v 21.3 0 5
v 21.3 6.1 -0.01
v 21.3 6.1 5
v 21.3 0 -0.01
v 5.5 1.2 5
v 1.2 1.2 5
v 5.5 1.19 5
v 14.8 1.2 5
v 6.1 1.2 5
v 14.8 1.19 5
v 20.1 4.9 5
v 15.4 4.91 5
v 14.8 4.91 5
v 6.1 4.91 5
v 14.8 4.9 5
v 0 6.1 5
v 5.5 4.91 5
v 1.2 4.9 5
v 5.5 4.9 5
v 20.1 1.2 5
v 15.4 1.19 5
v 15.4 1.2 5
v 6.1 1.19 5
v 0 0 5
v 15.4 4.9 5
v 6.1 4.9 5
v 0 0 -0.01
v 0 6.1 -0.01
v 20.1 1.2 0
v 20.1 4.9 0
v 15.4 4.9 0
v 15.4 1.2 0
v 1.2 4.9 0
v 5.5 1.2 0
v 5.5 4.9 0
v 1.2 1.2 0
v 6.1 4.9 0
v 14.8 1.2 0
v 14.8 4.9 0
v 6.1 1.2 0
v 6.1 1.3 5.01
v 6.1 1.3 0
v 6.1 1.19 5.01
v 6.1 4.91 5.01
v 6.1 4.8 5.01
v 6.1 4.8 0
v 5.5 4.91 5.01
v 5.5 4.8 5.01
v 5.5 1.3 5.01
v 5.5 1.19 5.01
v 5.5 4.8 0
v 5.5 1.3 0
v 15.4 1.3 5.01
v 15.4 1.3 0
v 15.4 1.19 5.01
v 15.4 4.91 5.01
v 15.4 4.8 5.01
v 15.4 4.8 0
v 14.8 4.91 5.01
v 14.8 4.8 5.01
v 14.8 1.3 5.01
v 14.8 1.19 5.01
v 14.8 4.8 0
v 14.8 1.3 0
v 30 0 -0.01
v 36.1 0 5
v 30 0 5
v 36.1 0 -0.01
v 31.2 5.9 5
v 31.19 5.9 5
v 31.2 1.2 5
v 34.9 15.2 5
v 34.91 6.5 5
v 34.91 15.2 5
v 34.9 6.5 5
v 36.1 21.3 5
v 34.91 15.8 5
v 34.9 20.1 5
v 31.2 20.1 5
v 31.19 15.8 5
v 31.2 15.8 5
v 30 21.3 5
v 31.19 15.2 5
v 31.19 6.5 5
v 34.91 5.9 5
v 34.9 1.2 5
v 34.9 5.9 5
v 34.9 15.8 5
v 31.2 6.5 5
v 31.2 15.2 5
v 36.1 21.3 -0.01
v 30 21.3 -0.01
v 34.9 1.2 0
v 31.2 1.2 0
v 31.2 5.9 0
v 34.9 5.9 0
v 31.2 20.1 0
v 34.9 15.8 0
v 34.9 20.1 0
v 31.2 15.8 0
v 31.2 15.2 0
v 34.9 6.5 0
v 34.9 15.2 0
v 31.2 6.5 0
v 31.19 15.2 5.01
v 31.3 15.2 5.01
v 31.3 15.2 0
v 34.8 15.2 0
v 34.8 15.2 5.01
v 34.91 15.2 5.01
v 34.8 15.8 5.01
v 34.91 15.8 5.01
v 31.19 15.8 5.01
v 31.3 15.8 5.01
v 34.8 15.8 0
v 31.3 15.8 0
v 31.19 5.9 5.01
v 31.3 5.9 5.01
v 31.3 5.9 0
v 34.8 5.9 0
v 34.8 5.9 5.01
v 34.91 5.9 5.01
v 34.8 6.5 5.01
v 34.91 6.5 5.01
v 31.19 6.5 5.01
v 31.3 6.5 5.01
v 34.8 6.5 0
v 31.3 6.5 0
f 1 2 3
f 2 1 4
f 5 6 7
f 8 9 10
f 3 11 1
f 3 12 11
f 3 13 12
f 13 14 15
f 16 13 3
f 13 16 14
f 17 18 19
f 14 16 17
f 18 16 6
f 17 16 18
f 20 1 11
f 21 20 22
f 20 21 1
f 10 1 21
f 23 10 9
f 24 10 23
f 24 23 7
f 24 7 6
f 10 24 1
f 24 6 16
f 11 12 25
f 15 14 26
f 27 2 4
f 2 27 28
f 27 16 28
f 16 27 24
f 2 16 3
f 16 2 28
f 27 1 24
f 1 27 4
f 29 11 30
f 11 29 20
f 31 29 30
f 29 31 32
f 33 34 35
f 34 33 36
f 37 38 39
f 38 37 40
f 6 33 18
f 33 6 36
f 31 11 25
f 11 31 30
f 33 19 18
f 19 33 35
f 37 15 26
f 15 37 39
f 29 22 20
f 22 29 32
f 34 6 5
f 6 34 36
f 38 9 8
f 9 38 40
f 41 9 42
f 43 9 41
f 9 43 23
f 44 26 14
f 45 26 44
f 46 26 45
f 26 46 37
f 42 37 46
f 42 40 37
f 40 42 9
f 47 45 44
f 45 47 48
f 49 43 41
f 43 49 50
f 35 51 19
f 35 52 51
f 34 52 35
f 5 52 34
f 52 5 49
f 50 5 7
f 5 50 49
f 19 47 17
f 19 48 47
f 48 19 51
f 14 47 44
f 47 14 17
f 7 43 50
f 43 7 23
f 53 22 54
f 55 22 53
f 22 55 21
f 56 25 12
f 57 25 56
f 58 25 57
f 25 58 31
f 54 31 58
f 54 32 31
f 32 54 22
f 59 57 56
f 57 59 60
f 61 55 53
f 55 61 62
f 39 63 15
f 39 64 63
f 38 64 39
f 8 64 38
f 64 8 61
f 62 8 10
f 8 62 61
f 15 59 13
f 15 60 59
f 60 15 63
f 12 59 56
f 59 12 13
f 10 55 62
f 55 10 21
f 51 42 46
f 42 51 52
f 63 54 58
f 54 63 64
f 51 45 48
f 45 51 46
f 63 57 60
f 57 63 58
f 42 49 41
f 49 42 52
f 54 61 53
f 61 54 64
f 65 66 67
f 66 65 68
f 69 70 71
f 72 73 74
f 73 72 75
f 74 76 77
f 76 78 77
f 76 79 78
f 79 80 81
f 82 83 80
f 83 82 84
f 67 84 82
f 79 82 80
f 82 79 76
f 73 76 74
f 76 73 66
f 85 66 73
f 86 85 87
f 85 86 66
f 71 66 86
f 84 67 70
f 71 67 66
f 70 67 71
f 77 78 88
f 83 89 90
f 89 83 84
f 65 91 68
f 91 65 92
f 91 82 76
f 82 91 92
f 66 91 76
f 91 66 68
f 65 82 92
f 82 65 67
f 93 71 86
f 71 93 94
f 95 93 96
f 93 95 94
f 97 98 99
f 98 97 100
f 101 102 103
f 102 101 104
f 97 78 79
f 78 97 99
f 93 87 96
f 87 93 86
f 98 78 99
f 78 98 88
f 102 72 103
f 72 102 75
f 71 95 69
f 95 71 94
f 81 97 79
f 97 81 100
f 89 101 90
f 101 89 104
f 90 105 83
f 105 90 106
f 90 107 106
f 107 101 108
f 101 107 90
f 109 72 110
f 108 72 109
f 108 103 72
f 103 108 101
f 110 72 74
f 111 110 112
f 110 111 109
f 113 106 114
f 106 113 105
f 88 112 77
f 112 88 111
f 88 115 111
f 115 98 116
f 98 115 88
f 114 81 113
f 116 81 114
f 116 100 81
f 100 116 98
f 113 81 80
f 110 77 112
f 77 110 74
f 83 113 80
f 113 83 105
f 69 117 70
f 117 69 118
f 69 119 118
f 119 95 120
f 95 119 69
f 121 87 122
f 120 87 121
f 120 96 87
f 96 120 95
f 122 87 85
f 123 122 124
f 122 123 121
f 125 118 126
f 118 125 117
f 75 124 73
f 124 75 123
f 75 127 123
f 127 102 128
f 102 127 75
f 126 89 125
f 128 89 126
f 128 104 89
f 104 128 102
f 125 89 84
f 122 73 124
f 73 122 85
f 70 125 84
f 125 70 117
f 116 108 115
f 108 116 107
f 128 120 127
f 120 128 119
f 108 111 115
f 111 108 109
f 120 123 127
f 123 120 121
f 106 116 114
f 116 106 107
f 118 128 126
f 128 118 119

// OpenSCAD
// file: ../../Base/Boxes.scad
// Fischertechnik Box Foundation
// Pre-designed Boxes

use <Constants.scad>

include <PlacementOptions.scad>

box190Width = 190;
box190Depth = 130;
box130Width = 130;
box130Depth = 95;
boxUsageHeight = 33.9;
boxWallThickness = 2.4;
boxBaseThickness = 1.0;

// getBoxWallThickness()
// Gets the wall thickness of a Fischertechnik Box

function getBoxWallThickness() = boxWallThickness;

// Gets the usable height of a fischertechnik box
function getBoxUsageHeight() = boxUsageHeight;

// Gets the thickness of the Fischertechnik box base.
function getBoxBaseThickness() = boxBaseThickness;

// Gets the usable inner space of a Box 190 as an x/y-list
function getBox190Space() = [
    box190Width - 2*getBoxWallThickness(), 
    box190Depth - 2*getBoxWallThickness() ];

// Imports the Fischertechnik empty box 130x190 mm and places it at position 0,0
// 190x130 are the outer sizes, the inner space is slightly smaller. Use getBox190Space() to get the inner sizes.
// This module needs the STL file "Fischertechnik Box 130x190.stl" in the library path.
// The box is positioned that the usable inner space is at the 0,0,0 position. The

module Box190() {
    translate([-getBoxWallThickness(),-getBoxWallThickness(),-getBoxBaseThickness()])
        import("Fischertechnik Box 130x190.stl", convexity=3);
}

// Gets the usable inner space of a Box 130 as an x/y-list
function getBox130Space() = [
    box130Width - 2*getBoxWallThickness(), 
    box130Depth - 2*getBoxWallThickness() ];

// Imports the Fischertechnik empty box 95x130 mm and places it at position 0,0
// 190x130 are the outer sizes, the inner space is slightly smaller. Use getBox190Space() to get the inner sizes.
// This module needs the STL file "Fischertechnik Box 95x130.stl" in the library path.
// The box is positioned that the usable inner space is at the 0,0,0 position. The

module Box130() {
    translate([-getBoxWallThickness(),-getBoxWallThickness(),-getBoxBaseThickness()])
        import("Fischertechnik Box 95x130.stl", convexity=3);
}

// Creates a web at the specified box walls
// corner 0 = LowerLeft, 1 = UpperLeft, 2 = UpperRight, 3 = LowerRight
// side 0 = LeftOfCorner, 1 = RightOfCorner
// distance = Distance in mm from the corner
// box = inner width and depth of the box (default: Box 190)
// webWidth = length of the web (default is 3 mms)
// webThickness = thickness of the web (default is 1 mm)

module BoxWeb(corner, side, distance, box=getBox190Space(), webWidth=3, webThickness=1.0) {
    sink = getBoxWallThickness()/2;

    width = (corner % 2 == 0) ? 
            (side == LeftOfCorner ? webWidth : webThickness) :
            (side == LeftOfCorner ? webThickness : webWidth);

    depth = (corner % 2 == 0) ? 
            (side == RightOfCorner ? webWidth : webThickness) :
            (side == RightOfCorner ? webThickness : webWidth);
    
    xDiff = corner == LowerLeft ? 
                (side == LeftOfCorner ? -sink : distance) :
            (corner == UpperLeft ?                
                (side == LeftOfCorner ? distance : -sink) :
            (corner == UpperRight ?
                (side == LeftOfCorner ? box.x-webWidth+sink : box.x-distance-webThickness) :
                (side == LeftOfCorner ? box.x-distance-webThickness: box.x-webWidth+sink)));

    yDiff = corner == LowerLeft ? 
                (side == RightOfCorner ? -sink : distance) :
            (corner == UpperLeft ?
                (side == RightOfCorner ? box.y-distance : box.y-webWidth+sink) :
            (corner == UpperRight ?
                (side == RightOfCorner ? box.y-webWidth+sink : box.y-distance) :
                (side == RightOfCorner ? distance : -sink)));
    
    translate([xDiff, yDiff, -getExcess()])
        cube([width, depth, boxUsageHeight + 2*getExcess()]);
}
// file: ../../Base/Rotation.scad
// Fischertechnik Box Foundation
// Geometry Helpers Rotation

include <PlacementOptions.scad>

// getRotatedSpace(space, rotation=NoRotation)
// Rotates the space dependent on the specified rotation

function getRotatedSpace(space, rotation=NoRotation) = [
    (rotation == Rotate90 || rotation == Rotate270) ? space.y : space.x,
    (rotation == Rotate90 || rotation == Rotate270) ? space.x : space.y
];

// Rotates the given space around the fixed left lower corner
// space = the space the children needs as width/depth list [width,depth]
// rotation = 0 Rotate0 degrees, 1 Rotate90 degrees, 2 Rotate180 degrees, 3 Rotate270 degrees (equivalent to -90)

module RotateFix(space, rotation=Rotate0) {
    dy = (rotation == Rotate0 || rotation == Rotate270) ? 0 :
        (rotation == Rotate90) ? space.x :
        space.y;
    dx = (rotation < Rotate180) ? 0 :
        (rotation == Rotate180) ? space.x :
        space.y;
    
    translate([dx, dy, 0])
        rotate([0, 0, rotations[rotation]])
            children();
}
// file: ../../Base/Alignment.scad
// Fischertechnik Box Foundation
// Geometry Helpers Alignment

include <PlacementOptions.scad>

// getAlignedX(elementWidth, spaceWidth, align=AlignRight, offset=0)
// Gets the aligned X offset of an element with the given
// width in the given space.
// elementWidth = The width of the element to positon
// spaceWidth = The space where the element should be aligned
// align = 0 AlignLeft, 1 AlignCenter, 2 AlignRight
// offset = an optional offset from the aligned position. When
// aligned left or centered, then positive values are in X direction.
// When aligned right then positive values are in negative X direction.

function getAlignedX(elementWidth, spaceWidth, align=AlignRight, offset=0) =
    (align == AlignLeft) ?
        offset :
        ((align == AlignCenter) ?
        (spaceWidth - elementWidth)/2 + offset :
        spaceWidth - offset - elementWidth);

// getAlignedY(elementDepth, spaceDepth, align=AlignTop, offset=0)
// Gets the aligned Y offset of an element with the given
// depth in the given space.
// elementDepth = The depth of the element to positon
// spaceDepth = The space where the element should be aligned
// align = 0 AlignBottom, 1 AlignCenter, 2 AlignTop
// offset = an optional offset from the aligned position. When
// aligned bottom or centered, then positive values are in Y direction.
// When aligned top then positive values are in negative Y direction.

function getAlignedY(elementDepth, spaceDepth, align=AlignTop, offset=0) =
    (align == AlignBottom) ?
        offset :
        ((align == AlignCenter) ?
        (spaceDepth - elementDepth)/2 + offset :
        spaceDepth - offset - elementDepth);
// file: ../../Base/Constants.scad
// Fischertechnik Box Foundation
// Constants

// Constant values necessary for multiple elements

// Base constants
dividerThickness = 1.2;
excess = 0.01;
fragments = 90;
tolerance = 0.8;

// Gets the thickness of a divider 
function getDividerThickness() = dividerThickness;

// Gets the excess that is used to merge walls into each other
function getExcess() = excess;

// Gets amount of fragments of a cylinder
function getFragments() = fragments;

// Gets the inner tolerance of a frame to each side
function getTolerance() = tolerance;


// Fischertechnik specific constants
axisDiameter = 4;
axisBottomDiameter = axisDiameter + 1;
standardEdgeDistance = 2.5;
standardWebDistance = 11.5;
standardCornerLength = 15;
tubeWallFactor = 1.6;

// Gets axis diameter
function getAxisDiameter() = axisDiameter;

// Gets axis bottom diameter for thicker part at the bottom
function getAxisBottomDiameter() = axisBottomDiameter;

// gets the standard distance to the wall of the box for dockable frames with webs
function getStandardEdgeDistance() = standardEdgeDistance;

// gets the standard distance of each web to the corner of the dockable frame
function getStandardWebDistance() = standardWebDistance;

// gets the standard length of the corner walls of a dockable frame
function getStandardCornerLength() = standardCornerLength;

// gets the wall thickness of a tube.
function getTubeWallThickness() = tubeWallFactor * getDividerThickness();
// file: ../../Base/PlacementOptions.scad
// Fischertechnik Box Foundation
// Placement Options

// Alignment
NoAlign = 0;
AlignLeft = 1;
AlignBottom = 2;
AlignCenter = 3;
AlignRight = 4;
AlignTop = 5;

// Element rotation degree steps
rotations = [0, -90, -180, -270];

// Rotation
NoRotation = 0;
Rotate0 = 0;
Rotate90 = 1;
Rotate180 = 2;
Rotate270 = 3;

// Docking (seen from above)
NoDock = -1;
DockLeft = 0;
DockTop = 1;
DockRight = 2;
DockCorner = 2;
DockBottom = 3;

// Web corners
LowerLeft = 0;
UpperLeft = 1;
UpperRight = 2;
LowerRight = 3;

// Web position relative to corner
LeftOfCorner = 0;
RightOfCorner = 1;
// file: ../../Elements/FrameElectronicBlockConnector.scad
// Fischertechnik Box Library
// Frame for Electronic Block Connector
// 36380

use <../Base/Constants.scad>
use <../ModelBase/Simple.scad>

width = 18.5;
depth = 3.3;
height = 5;
tolerance = 0.4;

// getFrameElectronicBlockConnectorSpace()
// Gets the space the frame for electronic block conector needs as width and depth (.x and .y as a list)

function getFrameElectronicBlockConnectorSpace() = 
    getFrameOuterVolume([width, depth, height], tolerance = tolerance);

// FrameElectronicBlockConnector()
// Frame for electronic block connector

module FrameElectronicBlockConnector() {    
    webThickness = 0.6;
    webDepth = 0.1;
    webDistance = 4.3;
    innerVolume = getFrameInnerVolume([width, depth, height], tolerance = tolerance);
    
    module InnerFrame() {
        Frame([width, depth, height], tolerance = tolerance);
        
        translate([0, getDividerThickness()-getExcess(), -getExcess()]) {
            translate([getDividerThickness()+webDistance, 0])
                cube([webThickness, innerVolume.y+2*getExcess(), innerVolume.z+getExcess()]);
            translate([getDividerThickness()+width-webDistance-webThickness, 0])
                cube([webThickness, innerVolume.y+2*getExcess(), innerVolume.z+getExcess()]);
        }
    }

    difference() {
        InnerFrame();

        cutoffWidth = innerVolume.x;
        cutoffDepth = innerVolume.y - 2*webDepth;
        
        translate([getDividerThickness(), getDividerThickness() + webDepth, 0])
            cube([cutoffWidth, cutoffDepth, height+1]);
    }
}

// Test
color("lightgray") {
    FrameElectronicBlockConnector();
}
// file: ../../Base/Placement.scad
// Fischertechnik Box Foundation
// Geometry Helpers Placement

use <Constants.scad>
use <Alignment.scad>
use <Rotation.scad>
use <Boxes.scad>

include <PlacementOptions.scad>

// Place(x=0, y=0, elementSpace=[0,0], alignX=AlignLeft, alignY=AlignBottom, rotation=Rotate0, boxSpace=getBox190Space())
// Places the child at the specified position
// y = Y-Position. This is a relative position when an X aligment is specified.
// x = X-Position. This is a relative position when an Y aligment is specified.
// elementSpace = space of the element to be placed [x,y]
// alignX = -1=NoAlign, 0 AlignLeft, 1 AlignCenter, 3 AlignRight (elementSpace and boxSpace required!)
// alignY = -1=NoAlign, 2 AlignBottom, 1 AlignCenter, 4 AlignTop (elementSpace and boxSpace required!)
// rotation = 0 Rotate0 0 degrees, 1 Rotate90 90 degrees, 
// 2 Rotate180 180 degrees, 3 Rotate270 270 degrees (equivalent to -90)
// boxSpace = Inner space of the box where the placement occurs [x,y] - default is Box 190x130 inner space

module Place(x=0, y=0, elementSpace=[0,0], 
  alignX=AlignLeft, alignY=AlignBottom, 
  rotation=NoRotation, boxSpace=getBox190Space()) {

    module Position(x, y, space, rotation=Rotate0) {
        translate([x, y, 0])
            RotateFix(space, rotation)
                children(0);
    }

    space = getRotatedSpace(elementSpace, rotation);
    alignedX = getAlignedX(space.x, boxSpace.x, alignX, x);
    alignedY = getAlignedY(space.y, boxSpace.y, alignY, y);
    Position(alignedX, alignedY, elementSpace, rotation)
        children(0);
}

// Center(space=getBox130Space(), elementSpace=[0,0])
// space = Space where the children is centered. For cylinder use centered=true and no elementSpace.
// elementSpace = space of the element to be centered [x,y]

module Center(space=getBox190Space(), elementSpace=[0,0]) {
    translate([(space.x - elementSpace.x) / 2, (space.y - elementSpace.y) / 2])
        children(0);
}

// CenterHorizontal(width=0, y=0, offset=0, space=getBox130Space())
// space = Space where the children is centered. For cylinder use centered=true and no elementSpace.
// elementSpace = space of the element to be centered [x,y]

module CenterHorizontal(width=0, y=0, offset=0, space=getBox190Space()) {
    translate([(space.x - width) / 2 + offset, y])
        children(0);
}

// CenterVertical(depth=0, x=0, offset=0, space=getBox130Space())
// space = Space where the children is centered. For cylinder use centered=true and no elementSpace.
// elementSpace = space of the element to be centered [x,y]

module CenterVerticalal(depth=0, x=0, offset=0, space=getBox190Space()) {
    translate([x, (space.y - depth) / 2 + offset])
        children(0);
}
// main file
// Fischertechnik Box Foundation
// Elements
// Test FrameElectronicBlockConnector

use <../../Base/Placement.scad>
use <../../Elements/FrameElectronicBlockConnector.scad>

include <../../Base/PlacementOptions.scad>

FrameElectronicBlockConnector();

Place(30, 0, elementSpace=getFrameElectronicBlockConnectorSpace(), rotation=Rotate90)
    FrameElectronicBlockConnector();
